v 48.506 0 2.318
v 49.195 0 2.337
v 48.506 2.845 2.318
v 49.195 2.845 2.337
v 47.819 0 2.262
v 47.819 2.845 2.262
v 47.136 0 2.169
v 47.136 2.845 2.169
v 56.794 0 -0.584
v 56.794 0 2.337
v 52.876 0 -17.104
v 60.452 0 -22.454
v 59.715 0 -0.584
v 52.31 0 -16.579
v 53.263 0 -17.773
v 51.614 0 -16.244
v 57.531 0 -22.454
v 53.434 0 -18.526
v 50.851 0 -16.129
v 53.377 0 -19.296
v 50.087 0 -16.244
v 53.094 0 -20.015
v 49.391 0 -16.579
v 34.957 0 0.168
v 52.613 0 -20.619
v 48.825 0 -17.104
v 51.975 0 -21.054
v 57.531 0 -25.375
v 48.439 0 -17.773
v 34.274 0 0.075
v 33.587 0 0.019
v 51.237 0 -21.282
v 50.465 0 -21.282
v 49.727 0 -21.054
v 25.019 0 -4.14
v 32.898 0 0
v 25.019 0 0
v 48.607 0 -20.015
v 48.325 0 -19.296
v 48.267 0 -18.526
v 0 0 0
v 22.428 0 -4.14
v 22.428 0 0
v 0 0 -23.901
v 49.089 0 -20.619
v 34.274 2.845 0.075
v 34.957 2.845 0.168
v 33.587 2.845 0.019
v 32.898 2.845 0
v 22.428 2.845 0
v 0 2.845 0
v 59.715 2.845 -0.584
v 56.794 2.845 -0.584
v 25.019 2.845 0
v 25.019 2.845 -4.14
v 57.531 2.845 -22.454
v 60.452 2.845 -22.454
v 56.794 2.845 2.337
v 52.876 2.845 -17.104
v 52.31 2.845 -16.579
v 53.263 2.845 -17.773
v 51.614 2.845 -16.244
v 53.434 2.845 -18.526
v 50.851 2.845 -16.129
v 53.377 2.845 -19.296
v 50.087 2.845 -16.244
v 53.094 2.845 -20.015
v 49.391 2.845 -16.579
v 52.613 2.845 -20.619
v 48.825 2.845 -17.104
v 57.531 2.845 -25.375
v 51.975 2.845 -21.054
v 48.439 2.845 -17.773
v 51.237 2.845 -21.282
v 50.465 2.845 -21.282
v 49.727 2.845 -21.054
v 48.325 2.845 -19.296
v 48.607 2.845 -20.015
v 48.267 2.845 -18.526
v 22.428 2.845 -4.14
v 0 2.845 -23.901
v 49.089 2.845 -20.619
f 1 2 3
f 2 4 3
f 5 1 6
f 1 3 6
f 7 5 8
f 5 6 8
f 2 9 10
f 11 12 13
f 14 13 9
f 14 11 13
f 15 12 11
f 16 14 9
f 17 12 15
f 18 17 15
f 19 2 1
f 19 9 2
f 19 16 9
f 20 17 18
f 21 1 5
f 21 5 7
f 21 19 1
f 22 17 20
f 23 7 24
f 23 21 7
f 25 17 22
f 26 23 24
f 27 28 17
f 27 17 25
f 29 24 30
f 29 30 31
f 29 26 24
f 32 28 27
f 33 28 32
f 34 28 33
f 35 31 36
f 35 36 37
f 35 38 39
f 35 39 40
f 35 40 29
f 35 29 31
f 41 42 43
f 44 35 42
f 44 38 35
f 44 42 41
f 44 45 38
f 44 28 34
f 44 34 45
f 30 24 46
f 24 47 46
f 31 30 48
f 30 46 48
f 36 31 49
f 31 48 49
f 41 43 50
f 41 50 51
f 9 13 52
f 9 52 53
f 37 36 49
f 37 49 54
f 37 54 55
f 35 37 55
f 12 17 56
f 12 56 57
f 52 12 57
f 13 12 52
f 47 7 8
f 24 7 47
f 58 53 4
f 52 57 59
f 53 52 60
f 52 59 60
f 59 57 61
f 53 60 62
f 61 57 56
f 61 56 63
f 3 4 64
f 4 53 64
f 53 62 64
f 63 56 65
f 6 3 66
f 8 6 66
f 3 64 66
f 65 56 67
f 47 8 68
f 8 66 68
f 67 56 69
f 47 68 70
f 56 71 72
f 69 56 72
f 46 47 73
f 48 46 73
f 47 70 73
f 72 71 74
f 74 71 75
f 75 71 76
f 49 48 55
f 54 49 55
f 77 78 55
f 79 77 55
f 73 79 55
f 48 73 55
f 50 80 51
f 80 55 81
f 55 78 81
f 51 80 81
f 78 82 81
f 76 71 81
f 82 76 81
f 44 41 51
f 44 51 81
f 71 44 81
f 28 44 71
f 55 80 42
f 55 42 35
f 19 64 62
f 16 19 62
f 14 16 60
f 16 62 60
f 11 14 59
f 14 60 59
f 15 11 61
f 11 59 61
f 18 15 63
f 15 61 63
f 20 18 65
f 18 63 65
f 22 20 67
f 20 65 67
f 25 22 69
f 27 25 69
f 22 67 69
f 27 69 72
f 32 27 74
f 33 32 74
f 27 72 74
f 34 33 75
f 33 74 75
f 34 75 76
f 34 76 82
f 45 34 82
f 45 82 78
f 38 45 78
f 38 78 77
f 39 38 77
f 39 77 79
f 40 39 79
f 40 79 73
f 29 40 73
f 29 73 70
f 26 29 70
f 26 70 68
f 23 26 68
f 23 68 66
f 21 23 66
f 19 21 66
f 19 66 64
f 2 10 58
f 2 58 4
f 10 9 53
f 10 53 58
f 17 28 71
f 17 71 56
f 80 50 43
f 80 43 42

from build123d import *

# Parameters (mm, degrees)
BOSS_EXTRUDE1_DEPTH = 2.8448
FILLET1_R           = 12.7
CUT_EXTRUDE1_REACH  = 67.623
SKETCH2_W           = 2.5908
SKETCH2_H           = 4.1402
CUT_EXTRUDE2_REACH  = 67.623
SKETCH3_R           = 2.5908


with BuildPart() as part:
    # Sketch1 → Boss-Extrude1 (new body)
    with BuildSketch(Plane(origin=(0, 0, 0), x_dir=(1, 0, 0), z_dir=(0, 1, 0))):
        Polygon((0, 0), (0, 23.9014), (57.531, 25.3746), (57.531, 22.4536), (60.452, 22.4536), (59.7154, 0.5842), (56.7944, 0.5842), (56.7944, -2.3368), (48.1584, -2.3368), (33.9344, 0), align=None)
    extrude(amount=BOSS_EXTRUDE1_DEPTH)

    # Fillet1
    fillet1_edges = [part.edges().sort_by_distance(p)[0] for p in [
        (48.1584, 1.4224, 2.3368),
        (33.9344, 1.4224, 0),
    ]]
    fillet(fillet1_edges, radius=FILLET1_R)

    # Sketch2 → Cut-Extrude1 (cut, up to next)
    with BuildSketch(Plane(origin=(0, 2.8448, 0), x_dir=(1, 0, 0), z_dir=(0, 1, 0)), mode=Mode.PRIVATE) as cut_extrude1_sk1:
        with Locations((23.7236, 2.0701)):
            Rectangle(SKETCH2_W, SKETCH2_H)
    cut_extrude1_tool1 = extrude(cut_extrude1_sk1.sketch, amount=-CUT_EXTRUDE1_REACH, mode=Mode.PRIVATE) & part.part
    add(cut_extrude1_tool1.solids().sort_by_distance((23.7236, 2.8448, -2.0701))[0], mode=Mode.SUBTRACT)

    # Sketch3 → Cut-Extrude2 (cut, up to next)
    with BuildSketch(Plane(origin=(0, 2.8448, 0), x_dir=(1, 0, 0), z_dir=(0, 1, 0)), mode=Mode.PRIVATE) as cut_extrude2_sk1:
        with Locations(Location((50.8508, 18.7198, 0), (0, 0, 270))):
            Circle(SKETCH3_R)
    cut_extrude2_tool1 = extrude(cut_extrude2_sk1.sketch, amount=-CUT_EXTRUDE2_REACH, mode=Mode.PRIVATE) & part.part
    add(cut_extrude2_tool1.solids().sort_by_distance((50.8508, 2.8448, -18.7198))[0], mode=Mode.SUBTRACT)


solid = part.part
